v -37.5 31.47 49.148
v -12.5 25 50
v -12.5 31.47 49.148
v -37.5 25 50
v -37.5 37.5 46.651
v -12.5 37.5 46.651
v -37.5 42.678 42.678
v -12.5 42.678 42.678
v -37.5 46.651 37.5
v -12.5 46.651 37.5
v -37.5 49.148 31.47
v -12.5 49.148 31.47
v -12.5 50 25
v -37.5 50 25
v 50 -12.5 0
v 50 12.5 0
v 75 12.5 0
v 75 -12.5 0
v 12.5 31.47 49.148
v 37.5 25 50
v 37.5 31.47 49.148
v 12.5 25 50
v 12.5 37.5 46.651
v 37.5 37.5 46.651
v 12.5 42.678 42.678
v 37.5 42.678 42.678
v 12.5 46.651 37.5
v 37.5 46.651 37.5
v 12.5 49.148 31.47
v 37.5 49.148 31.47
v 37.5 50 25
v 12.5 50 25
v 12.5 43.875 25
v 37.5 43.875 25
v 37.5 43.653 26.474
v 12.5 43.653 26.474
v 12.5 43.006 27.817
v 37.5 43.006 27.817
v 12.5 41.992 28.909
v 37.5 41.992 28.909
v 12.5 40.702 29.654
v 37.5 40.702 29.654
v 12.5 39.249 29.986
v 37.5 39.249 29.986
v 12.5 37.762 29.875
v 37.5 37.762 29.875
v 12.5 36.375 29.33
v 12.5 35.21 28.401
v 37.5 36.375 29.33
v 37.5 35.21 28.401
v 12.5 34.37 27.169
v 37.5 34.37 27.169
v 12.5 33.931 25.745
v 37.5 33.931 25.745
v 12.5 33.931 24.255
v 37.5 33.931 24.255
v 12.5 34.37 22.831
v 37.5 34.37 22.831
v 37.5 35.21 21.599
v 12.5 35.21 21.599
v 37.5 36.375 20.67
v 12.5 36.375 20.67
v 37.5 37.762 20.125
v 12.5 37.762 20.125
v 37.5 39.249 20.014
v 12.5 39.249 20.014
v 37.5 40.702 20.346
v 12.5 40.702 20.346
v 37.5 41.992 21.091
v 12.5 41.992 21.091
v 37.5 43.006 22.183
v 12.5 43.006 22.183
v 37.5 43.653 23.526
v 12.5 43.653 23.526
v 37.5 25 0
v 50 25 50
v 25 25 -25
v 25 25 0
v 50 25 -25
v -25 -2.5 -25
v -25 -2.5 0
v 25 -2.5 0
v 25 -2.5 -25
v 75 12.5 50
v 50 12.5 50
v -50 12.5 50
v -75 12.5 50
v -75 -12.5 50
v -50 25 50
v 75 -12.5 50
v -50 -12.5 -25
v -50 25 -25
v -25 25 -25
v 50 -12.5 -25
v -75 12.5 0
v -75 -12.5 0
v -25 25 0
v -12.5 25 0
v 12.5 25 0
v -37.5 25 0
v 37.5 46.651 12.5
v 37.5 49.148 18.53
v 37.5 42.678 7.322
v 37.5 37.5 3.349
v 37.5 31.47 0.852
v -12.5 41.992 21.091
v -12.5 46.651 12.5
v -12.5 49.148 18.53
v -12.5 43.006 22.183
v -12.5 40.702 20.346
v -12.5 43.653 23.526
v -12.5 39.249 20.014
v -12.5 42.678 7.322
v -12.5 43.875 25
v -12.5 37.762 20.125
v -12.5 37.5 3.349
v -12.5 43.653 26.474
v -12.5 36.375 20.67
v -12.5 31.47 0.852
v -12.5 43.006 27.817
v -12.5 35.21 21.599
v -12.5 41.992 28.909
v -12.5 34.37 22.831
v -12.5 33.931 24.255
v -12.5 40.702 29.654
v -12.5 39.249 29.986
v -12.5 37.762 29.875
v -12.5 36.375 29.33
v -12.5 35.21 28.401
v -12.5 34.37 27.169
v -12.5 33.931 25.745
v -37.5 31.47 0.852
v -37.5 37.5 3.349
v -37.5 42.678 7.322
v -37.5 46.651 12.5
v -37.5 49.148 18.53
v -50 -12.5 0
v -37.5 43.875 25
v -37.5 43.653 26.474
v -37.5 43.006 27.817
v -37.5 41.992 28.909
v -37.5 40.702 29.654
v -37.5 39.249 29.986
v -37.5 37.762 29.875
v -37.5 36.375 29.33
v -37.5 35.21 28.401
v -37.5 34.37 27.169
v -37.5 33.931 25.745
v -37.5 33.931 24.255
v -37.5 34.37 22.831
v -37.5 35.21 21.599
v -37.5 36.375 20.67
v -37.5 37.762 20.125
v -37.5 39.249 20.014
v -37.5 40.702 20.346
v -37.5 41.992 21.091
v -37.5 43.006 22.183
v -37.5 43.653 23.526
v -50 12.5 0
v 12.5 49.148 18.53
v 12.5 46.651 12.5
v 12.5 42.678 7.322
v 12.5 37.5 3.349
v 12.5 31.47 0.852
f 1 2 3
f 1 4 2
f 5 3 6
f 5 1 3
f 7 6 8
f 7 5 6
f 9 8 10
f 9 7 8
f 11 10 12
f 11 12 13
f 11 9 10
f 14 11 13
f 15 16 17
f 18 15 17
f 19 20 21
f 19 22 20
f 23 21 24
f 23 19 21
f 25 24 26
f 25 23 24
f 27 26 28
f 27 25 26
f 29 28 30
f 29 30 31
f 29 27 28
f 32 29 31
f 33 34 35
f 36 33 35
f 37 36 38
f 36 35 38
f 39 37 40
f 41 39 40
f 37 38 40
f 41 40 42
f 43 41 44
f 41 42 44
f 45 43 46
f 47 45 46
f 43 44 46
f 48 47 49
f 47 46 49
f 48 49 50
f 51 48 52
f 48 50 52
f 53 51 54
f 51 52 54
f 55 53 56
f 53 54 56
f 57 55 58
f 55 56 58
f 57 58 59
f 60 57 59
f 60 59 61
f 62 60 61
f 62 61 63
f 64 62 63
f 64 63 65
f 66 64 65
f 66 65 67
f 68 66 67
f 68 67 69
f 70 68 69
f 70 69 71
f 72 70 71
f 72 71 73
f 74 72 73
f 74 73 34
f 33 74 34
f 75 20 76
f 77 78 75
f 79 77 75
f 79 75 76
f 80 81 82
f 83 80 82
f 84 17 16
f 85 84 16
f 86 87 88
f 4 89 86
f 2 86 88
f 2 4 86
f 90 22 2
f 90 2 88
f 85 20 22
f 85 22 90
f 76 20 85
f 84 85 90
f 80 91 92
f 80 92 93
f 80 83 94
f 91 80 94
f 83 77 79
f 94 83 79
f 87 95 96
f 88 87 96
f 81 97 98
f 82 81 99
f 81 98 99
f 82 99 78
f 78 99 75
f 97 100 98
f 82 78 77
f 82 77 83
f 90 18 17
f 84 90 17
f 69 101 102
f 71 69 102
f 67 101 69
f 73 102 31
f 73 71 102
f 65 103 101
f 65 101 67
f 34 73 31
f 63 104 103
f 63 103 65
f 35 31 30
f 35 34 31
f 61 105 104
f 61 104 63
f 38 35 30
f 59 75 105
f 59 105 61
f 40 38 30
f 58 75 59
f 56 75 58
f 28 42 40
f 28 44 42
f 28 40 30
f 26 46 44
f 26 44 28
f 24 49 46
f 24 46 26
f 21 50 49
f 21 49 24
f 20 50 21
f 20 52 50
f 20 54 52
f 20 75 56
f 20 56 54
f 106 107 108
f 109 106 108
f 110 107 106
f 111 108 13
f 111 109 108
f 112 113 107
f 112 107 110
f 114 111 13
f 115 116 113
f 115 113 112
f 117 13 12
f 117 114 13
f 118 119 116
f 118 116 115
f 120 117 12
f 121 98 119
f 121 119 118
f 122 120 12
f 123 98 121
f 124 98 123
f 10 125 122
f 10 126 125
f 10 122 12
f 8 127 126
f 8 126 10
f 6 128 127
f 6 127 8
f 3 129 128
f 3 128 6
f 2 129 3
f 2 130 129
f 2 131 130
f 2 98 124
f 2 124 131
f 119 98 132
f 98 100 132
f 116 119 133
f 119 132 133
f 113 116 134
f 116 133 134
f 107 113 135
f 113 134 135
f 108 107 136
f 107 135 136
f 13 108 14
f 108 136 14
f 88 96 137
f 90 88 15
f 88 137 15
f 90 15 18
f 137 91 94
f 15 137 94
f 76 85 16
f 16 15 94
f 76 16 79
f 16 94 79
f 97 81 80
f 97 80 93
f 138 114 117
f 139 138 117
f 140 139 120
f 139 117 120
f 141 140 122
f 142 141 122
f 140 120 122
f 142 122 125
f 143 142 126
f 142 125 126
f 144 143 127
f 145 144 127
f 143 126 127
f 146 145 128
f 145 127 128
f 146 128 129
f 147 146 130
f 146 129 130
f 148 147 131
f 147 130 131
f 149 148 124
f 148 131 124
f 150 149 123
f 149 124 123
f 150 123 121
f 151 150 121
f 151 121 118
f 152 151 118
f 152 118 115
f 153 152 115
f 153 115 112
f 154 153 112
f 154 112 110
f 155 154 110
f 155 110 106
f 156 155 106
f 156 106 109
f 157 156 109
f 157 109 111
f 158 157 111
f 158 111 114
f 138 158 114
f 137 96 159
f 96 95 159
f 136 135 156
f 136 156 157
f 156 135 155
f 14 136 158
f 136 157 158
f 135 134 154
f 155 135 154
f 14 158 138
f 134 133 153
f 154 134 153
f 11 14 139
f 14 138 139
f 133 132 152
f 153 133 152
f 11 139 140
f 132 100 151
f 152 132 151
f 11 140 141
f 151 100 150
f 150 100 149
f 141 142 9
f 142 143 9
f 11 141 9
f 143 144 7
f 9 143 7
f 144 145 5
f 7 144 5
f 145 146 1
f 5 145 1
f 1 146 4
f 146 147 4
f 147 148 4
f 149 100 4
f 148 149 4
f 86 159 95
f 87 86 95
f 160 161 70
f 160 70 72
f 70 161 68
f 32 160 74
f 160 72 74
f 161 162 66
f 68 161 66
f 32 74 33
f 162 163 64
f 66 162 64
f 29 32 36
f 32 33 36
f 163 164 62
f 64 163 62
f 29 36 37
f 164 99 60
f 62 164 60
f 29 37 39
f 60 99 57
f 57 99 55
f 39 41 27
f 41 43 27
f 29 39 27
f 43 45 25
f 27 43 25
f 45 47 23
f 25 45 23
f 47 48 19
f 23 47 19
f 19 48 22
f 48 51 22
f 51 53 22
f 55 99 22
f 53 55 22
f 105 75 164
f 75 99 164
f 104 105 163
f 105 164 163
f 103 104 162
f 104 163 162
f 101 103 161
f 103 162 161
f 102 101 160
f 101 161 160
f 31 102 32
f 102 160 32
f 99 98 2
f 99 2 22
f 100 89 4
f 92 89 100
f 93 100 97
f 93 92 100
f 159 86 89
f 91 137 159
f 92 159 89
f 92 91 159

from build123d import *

# Parameters (mm, degrees)
F0_W     = 100
F0_H     = 12.5
F1_DEPTH = 50
F2_W     = 25
F2_H     = 50
F3_DEPTH = 25
F4_R     = 24.99999
F5_R     = 5
F6_DEPTH = 112.501
F7_W     = 50
F7_H     = 10
F8_DEPTH = 75


# Not quite as in the source:
# - a fillet or chamfer is up to 0.001 mm smaller than in the source, because OpenCascade refuses the exact size


with BuildPart() as f1:
    # F0 (on Top) → F1 (new body)
    with BuildSketch(Plane.XY):
        Polygon((75, -12.5), (75, 12.5), (50, 12.5), (50, 0), (-50, 0), (-50, 12.5), (-75, 12.5), (-75, -12.5), align=None)
        with Locations((0, 6.25)):
            Rectangle(F0_W, F0_H)
        with Locations((0, 18.75)):
            Rectangle(F0_W, F0_H)
    extrude(amount=F1_DEPTH)

    # F2 (on face) → F3 (join)
    with BuildSketch(Plane(origin=(0, 25, 0), x_dir=(-1, 0, 0), z_dir=(0, 1, 0))):
        with Locations((-25, 25)):
            Rectangle(F2_W, F2_H)
        with Locations((25, 25)):
            Rectangle(F2_W, F2_H)
    extrude(amount=F3_DEPTH)

    # F4 (radius 25 in the source; OpenCascade refuses exactly that, so slightly less here)
    f4_edges = [f1.edges().sort_by_distance(p)[0] for p in [
        (25, 50, 50),
        (25, 50, 0),
        (-25, 50, 0),
        (-25, 50, 50),
    ]]
    fillet(f4_edges, radius=F4_R)

    # F5 (on face) → F6 (cut, through all)
    with BuildSketch(Plane.YZ.offset(37.5)):
        with Locations((38.875002414, 25)):
            Circle(F5_R)
    extrude(amount=-F6_DEPTH, mode=Mode.SUBTRACT)

    # F7 (on face) → F8 (join)
    with BuildSketch(Plane.XY.offset(50)):
        Polygon((25, 25), (25, -2.5), (25, -12.5), (50, -12.5), (50, 12.5), (50, 25), (37.5, 25), align=None)
        with Locations((0, -7.5)):
            Rectangle(F7_W, F7_H)
        Polygon((-37.5, 25), (-50, 25), (-50, 12.5), (-50, -12.5), (-25, -12.5), (-25, -2.5), (-25, 25), align=None)
    extrude(amount=-F8_DEPTH)


solid = f1.part
